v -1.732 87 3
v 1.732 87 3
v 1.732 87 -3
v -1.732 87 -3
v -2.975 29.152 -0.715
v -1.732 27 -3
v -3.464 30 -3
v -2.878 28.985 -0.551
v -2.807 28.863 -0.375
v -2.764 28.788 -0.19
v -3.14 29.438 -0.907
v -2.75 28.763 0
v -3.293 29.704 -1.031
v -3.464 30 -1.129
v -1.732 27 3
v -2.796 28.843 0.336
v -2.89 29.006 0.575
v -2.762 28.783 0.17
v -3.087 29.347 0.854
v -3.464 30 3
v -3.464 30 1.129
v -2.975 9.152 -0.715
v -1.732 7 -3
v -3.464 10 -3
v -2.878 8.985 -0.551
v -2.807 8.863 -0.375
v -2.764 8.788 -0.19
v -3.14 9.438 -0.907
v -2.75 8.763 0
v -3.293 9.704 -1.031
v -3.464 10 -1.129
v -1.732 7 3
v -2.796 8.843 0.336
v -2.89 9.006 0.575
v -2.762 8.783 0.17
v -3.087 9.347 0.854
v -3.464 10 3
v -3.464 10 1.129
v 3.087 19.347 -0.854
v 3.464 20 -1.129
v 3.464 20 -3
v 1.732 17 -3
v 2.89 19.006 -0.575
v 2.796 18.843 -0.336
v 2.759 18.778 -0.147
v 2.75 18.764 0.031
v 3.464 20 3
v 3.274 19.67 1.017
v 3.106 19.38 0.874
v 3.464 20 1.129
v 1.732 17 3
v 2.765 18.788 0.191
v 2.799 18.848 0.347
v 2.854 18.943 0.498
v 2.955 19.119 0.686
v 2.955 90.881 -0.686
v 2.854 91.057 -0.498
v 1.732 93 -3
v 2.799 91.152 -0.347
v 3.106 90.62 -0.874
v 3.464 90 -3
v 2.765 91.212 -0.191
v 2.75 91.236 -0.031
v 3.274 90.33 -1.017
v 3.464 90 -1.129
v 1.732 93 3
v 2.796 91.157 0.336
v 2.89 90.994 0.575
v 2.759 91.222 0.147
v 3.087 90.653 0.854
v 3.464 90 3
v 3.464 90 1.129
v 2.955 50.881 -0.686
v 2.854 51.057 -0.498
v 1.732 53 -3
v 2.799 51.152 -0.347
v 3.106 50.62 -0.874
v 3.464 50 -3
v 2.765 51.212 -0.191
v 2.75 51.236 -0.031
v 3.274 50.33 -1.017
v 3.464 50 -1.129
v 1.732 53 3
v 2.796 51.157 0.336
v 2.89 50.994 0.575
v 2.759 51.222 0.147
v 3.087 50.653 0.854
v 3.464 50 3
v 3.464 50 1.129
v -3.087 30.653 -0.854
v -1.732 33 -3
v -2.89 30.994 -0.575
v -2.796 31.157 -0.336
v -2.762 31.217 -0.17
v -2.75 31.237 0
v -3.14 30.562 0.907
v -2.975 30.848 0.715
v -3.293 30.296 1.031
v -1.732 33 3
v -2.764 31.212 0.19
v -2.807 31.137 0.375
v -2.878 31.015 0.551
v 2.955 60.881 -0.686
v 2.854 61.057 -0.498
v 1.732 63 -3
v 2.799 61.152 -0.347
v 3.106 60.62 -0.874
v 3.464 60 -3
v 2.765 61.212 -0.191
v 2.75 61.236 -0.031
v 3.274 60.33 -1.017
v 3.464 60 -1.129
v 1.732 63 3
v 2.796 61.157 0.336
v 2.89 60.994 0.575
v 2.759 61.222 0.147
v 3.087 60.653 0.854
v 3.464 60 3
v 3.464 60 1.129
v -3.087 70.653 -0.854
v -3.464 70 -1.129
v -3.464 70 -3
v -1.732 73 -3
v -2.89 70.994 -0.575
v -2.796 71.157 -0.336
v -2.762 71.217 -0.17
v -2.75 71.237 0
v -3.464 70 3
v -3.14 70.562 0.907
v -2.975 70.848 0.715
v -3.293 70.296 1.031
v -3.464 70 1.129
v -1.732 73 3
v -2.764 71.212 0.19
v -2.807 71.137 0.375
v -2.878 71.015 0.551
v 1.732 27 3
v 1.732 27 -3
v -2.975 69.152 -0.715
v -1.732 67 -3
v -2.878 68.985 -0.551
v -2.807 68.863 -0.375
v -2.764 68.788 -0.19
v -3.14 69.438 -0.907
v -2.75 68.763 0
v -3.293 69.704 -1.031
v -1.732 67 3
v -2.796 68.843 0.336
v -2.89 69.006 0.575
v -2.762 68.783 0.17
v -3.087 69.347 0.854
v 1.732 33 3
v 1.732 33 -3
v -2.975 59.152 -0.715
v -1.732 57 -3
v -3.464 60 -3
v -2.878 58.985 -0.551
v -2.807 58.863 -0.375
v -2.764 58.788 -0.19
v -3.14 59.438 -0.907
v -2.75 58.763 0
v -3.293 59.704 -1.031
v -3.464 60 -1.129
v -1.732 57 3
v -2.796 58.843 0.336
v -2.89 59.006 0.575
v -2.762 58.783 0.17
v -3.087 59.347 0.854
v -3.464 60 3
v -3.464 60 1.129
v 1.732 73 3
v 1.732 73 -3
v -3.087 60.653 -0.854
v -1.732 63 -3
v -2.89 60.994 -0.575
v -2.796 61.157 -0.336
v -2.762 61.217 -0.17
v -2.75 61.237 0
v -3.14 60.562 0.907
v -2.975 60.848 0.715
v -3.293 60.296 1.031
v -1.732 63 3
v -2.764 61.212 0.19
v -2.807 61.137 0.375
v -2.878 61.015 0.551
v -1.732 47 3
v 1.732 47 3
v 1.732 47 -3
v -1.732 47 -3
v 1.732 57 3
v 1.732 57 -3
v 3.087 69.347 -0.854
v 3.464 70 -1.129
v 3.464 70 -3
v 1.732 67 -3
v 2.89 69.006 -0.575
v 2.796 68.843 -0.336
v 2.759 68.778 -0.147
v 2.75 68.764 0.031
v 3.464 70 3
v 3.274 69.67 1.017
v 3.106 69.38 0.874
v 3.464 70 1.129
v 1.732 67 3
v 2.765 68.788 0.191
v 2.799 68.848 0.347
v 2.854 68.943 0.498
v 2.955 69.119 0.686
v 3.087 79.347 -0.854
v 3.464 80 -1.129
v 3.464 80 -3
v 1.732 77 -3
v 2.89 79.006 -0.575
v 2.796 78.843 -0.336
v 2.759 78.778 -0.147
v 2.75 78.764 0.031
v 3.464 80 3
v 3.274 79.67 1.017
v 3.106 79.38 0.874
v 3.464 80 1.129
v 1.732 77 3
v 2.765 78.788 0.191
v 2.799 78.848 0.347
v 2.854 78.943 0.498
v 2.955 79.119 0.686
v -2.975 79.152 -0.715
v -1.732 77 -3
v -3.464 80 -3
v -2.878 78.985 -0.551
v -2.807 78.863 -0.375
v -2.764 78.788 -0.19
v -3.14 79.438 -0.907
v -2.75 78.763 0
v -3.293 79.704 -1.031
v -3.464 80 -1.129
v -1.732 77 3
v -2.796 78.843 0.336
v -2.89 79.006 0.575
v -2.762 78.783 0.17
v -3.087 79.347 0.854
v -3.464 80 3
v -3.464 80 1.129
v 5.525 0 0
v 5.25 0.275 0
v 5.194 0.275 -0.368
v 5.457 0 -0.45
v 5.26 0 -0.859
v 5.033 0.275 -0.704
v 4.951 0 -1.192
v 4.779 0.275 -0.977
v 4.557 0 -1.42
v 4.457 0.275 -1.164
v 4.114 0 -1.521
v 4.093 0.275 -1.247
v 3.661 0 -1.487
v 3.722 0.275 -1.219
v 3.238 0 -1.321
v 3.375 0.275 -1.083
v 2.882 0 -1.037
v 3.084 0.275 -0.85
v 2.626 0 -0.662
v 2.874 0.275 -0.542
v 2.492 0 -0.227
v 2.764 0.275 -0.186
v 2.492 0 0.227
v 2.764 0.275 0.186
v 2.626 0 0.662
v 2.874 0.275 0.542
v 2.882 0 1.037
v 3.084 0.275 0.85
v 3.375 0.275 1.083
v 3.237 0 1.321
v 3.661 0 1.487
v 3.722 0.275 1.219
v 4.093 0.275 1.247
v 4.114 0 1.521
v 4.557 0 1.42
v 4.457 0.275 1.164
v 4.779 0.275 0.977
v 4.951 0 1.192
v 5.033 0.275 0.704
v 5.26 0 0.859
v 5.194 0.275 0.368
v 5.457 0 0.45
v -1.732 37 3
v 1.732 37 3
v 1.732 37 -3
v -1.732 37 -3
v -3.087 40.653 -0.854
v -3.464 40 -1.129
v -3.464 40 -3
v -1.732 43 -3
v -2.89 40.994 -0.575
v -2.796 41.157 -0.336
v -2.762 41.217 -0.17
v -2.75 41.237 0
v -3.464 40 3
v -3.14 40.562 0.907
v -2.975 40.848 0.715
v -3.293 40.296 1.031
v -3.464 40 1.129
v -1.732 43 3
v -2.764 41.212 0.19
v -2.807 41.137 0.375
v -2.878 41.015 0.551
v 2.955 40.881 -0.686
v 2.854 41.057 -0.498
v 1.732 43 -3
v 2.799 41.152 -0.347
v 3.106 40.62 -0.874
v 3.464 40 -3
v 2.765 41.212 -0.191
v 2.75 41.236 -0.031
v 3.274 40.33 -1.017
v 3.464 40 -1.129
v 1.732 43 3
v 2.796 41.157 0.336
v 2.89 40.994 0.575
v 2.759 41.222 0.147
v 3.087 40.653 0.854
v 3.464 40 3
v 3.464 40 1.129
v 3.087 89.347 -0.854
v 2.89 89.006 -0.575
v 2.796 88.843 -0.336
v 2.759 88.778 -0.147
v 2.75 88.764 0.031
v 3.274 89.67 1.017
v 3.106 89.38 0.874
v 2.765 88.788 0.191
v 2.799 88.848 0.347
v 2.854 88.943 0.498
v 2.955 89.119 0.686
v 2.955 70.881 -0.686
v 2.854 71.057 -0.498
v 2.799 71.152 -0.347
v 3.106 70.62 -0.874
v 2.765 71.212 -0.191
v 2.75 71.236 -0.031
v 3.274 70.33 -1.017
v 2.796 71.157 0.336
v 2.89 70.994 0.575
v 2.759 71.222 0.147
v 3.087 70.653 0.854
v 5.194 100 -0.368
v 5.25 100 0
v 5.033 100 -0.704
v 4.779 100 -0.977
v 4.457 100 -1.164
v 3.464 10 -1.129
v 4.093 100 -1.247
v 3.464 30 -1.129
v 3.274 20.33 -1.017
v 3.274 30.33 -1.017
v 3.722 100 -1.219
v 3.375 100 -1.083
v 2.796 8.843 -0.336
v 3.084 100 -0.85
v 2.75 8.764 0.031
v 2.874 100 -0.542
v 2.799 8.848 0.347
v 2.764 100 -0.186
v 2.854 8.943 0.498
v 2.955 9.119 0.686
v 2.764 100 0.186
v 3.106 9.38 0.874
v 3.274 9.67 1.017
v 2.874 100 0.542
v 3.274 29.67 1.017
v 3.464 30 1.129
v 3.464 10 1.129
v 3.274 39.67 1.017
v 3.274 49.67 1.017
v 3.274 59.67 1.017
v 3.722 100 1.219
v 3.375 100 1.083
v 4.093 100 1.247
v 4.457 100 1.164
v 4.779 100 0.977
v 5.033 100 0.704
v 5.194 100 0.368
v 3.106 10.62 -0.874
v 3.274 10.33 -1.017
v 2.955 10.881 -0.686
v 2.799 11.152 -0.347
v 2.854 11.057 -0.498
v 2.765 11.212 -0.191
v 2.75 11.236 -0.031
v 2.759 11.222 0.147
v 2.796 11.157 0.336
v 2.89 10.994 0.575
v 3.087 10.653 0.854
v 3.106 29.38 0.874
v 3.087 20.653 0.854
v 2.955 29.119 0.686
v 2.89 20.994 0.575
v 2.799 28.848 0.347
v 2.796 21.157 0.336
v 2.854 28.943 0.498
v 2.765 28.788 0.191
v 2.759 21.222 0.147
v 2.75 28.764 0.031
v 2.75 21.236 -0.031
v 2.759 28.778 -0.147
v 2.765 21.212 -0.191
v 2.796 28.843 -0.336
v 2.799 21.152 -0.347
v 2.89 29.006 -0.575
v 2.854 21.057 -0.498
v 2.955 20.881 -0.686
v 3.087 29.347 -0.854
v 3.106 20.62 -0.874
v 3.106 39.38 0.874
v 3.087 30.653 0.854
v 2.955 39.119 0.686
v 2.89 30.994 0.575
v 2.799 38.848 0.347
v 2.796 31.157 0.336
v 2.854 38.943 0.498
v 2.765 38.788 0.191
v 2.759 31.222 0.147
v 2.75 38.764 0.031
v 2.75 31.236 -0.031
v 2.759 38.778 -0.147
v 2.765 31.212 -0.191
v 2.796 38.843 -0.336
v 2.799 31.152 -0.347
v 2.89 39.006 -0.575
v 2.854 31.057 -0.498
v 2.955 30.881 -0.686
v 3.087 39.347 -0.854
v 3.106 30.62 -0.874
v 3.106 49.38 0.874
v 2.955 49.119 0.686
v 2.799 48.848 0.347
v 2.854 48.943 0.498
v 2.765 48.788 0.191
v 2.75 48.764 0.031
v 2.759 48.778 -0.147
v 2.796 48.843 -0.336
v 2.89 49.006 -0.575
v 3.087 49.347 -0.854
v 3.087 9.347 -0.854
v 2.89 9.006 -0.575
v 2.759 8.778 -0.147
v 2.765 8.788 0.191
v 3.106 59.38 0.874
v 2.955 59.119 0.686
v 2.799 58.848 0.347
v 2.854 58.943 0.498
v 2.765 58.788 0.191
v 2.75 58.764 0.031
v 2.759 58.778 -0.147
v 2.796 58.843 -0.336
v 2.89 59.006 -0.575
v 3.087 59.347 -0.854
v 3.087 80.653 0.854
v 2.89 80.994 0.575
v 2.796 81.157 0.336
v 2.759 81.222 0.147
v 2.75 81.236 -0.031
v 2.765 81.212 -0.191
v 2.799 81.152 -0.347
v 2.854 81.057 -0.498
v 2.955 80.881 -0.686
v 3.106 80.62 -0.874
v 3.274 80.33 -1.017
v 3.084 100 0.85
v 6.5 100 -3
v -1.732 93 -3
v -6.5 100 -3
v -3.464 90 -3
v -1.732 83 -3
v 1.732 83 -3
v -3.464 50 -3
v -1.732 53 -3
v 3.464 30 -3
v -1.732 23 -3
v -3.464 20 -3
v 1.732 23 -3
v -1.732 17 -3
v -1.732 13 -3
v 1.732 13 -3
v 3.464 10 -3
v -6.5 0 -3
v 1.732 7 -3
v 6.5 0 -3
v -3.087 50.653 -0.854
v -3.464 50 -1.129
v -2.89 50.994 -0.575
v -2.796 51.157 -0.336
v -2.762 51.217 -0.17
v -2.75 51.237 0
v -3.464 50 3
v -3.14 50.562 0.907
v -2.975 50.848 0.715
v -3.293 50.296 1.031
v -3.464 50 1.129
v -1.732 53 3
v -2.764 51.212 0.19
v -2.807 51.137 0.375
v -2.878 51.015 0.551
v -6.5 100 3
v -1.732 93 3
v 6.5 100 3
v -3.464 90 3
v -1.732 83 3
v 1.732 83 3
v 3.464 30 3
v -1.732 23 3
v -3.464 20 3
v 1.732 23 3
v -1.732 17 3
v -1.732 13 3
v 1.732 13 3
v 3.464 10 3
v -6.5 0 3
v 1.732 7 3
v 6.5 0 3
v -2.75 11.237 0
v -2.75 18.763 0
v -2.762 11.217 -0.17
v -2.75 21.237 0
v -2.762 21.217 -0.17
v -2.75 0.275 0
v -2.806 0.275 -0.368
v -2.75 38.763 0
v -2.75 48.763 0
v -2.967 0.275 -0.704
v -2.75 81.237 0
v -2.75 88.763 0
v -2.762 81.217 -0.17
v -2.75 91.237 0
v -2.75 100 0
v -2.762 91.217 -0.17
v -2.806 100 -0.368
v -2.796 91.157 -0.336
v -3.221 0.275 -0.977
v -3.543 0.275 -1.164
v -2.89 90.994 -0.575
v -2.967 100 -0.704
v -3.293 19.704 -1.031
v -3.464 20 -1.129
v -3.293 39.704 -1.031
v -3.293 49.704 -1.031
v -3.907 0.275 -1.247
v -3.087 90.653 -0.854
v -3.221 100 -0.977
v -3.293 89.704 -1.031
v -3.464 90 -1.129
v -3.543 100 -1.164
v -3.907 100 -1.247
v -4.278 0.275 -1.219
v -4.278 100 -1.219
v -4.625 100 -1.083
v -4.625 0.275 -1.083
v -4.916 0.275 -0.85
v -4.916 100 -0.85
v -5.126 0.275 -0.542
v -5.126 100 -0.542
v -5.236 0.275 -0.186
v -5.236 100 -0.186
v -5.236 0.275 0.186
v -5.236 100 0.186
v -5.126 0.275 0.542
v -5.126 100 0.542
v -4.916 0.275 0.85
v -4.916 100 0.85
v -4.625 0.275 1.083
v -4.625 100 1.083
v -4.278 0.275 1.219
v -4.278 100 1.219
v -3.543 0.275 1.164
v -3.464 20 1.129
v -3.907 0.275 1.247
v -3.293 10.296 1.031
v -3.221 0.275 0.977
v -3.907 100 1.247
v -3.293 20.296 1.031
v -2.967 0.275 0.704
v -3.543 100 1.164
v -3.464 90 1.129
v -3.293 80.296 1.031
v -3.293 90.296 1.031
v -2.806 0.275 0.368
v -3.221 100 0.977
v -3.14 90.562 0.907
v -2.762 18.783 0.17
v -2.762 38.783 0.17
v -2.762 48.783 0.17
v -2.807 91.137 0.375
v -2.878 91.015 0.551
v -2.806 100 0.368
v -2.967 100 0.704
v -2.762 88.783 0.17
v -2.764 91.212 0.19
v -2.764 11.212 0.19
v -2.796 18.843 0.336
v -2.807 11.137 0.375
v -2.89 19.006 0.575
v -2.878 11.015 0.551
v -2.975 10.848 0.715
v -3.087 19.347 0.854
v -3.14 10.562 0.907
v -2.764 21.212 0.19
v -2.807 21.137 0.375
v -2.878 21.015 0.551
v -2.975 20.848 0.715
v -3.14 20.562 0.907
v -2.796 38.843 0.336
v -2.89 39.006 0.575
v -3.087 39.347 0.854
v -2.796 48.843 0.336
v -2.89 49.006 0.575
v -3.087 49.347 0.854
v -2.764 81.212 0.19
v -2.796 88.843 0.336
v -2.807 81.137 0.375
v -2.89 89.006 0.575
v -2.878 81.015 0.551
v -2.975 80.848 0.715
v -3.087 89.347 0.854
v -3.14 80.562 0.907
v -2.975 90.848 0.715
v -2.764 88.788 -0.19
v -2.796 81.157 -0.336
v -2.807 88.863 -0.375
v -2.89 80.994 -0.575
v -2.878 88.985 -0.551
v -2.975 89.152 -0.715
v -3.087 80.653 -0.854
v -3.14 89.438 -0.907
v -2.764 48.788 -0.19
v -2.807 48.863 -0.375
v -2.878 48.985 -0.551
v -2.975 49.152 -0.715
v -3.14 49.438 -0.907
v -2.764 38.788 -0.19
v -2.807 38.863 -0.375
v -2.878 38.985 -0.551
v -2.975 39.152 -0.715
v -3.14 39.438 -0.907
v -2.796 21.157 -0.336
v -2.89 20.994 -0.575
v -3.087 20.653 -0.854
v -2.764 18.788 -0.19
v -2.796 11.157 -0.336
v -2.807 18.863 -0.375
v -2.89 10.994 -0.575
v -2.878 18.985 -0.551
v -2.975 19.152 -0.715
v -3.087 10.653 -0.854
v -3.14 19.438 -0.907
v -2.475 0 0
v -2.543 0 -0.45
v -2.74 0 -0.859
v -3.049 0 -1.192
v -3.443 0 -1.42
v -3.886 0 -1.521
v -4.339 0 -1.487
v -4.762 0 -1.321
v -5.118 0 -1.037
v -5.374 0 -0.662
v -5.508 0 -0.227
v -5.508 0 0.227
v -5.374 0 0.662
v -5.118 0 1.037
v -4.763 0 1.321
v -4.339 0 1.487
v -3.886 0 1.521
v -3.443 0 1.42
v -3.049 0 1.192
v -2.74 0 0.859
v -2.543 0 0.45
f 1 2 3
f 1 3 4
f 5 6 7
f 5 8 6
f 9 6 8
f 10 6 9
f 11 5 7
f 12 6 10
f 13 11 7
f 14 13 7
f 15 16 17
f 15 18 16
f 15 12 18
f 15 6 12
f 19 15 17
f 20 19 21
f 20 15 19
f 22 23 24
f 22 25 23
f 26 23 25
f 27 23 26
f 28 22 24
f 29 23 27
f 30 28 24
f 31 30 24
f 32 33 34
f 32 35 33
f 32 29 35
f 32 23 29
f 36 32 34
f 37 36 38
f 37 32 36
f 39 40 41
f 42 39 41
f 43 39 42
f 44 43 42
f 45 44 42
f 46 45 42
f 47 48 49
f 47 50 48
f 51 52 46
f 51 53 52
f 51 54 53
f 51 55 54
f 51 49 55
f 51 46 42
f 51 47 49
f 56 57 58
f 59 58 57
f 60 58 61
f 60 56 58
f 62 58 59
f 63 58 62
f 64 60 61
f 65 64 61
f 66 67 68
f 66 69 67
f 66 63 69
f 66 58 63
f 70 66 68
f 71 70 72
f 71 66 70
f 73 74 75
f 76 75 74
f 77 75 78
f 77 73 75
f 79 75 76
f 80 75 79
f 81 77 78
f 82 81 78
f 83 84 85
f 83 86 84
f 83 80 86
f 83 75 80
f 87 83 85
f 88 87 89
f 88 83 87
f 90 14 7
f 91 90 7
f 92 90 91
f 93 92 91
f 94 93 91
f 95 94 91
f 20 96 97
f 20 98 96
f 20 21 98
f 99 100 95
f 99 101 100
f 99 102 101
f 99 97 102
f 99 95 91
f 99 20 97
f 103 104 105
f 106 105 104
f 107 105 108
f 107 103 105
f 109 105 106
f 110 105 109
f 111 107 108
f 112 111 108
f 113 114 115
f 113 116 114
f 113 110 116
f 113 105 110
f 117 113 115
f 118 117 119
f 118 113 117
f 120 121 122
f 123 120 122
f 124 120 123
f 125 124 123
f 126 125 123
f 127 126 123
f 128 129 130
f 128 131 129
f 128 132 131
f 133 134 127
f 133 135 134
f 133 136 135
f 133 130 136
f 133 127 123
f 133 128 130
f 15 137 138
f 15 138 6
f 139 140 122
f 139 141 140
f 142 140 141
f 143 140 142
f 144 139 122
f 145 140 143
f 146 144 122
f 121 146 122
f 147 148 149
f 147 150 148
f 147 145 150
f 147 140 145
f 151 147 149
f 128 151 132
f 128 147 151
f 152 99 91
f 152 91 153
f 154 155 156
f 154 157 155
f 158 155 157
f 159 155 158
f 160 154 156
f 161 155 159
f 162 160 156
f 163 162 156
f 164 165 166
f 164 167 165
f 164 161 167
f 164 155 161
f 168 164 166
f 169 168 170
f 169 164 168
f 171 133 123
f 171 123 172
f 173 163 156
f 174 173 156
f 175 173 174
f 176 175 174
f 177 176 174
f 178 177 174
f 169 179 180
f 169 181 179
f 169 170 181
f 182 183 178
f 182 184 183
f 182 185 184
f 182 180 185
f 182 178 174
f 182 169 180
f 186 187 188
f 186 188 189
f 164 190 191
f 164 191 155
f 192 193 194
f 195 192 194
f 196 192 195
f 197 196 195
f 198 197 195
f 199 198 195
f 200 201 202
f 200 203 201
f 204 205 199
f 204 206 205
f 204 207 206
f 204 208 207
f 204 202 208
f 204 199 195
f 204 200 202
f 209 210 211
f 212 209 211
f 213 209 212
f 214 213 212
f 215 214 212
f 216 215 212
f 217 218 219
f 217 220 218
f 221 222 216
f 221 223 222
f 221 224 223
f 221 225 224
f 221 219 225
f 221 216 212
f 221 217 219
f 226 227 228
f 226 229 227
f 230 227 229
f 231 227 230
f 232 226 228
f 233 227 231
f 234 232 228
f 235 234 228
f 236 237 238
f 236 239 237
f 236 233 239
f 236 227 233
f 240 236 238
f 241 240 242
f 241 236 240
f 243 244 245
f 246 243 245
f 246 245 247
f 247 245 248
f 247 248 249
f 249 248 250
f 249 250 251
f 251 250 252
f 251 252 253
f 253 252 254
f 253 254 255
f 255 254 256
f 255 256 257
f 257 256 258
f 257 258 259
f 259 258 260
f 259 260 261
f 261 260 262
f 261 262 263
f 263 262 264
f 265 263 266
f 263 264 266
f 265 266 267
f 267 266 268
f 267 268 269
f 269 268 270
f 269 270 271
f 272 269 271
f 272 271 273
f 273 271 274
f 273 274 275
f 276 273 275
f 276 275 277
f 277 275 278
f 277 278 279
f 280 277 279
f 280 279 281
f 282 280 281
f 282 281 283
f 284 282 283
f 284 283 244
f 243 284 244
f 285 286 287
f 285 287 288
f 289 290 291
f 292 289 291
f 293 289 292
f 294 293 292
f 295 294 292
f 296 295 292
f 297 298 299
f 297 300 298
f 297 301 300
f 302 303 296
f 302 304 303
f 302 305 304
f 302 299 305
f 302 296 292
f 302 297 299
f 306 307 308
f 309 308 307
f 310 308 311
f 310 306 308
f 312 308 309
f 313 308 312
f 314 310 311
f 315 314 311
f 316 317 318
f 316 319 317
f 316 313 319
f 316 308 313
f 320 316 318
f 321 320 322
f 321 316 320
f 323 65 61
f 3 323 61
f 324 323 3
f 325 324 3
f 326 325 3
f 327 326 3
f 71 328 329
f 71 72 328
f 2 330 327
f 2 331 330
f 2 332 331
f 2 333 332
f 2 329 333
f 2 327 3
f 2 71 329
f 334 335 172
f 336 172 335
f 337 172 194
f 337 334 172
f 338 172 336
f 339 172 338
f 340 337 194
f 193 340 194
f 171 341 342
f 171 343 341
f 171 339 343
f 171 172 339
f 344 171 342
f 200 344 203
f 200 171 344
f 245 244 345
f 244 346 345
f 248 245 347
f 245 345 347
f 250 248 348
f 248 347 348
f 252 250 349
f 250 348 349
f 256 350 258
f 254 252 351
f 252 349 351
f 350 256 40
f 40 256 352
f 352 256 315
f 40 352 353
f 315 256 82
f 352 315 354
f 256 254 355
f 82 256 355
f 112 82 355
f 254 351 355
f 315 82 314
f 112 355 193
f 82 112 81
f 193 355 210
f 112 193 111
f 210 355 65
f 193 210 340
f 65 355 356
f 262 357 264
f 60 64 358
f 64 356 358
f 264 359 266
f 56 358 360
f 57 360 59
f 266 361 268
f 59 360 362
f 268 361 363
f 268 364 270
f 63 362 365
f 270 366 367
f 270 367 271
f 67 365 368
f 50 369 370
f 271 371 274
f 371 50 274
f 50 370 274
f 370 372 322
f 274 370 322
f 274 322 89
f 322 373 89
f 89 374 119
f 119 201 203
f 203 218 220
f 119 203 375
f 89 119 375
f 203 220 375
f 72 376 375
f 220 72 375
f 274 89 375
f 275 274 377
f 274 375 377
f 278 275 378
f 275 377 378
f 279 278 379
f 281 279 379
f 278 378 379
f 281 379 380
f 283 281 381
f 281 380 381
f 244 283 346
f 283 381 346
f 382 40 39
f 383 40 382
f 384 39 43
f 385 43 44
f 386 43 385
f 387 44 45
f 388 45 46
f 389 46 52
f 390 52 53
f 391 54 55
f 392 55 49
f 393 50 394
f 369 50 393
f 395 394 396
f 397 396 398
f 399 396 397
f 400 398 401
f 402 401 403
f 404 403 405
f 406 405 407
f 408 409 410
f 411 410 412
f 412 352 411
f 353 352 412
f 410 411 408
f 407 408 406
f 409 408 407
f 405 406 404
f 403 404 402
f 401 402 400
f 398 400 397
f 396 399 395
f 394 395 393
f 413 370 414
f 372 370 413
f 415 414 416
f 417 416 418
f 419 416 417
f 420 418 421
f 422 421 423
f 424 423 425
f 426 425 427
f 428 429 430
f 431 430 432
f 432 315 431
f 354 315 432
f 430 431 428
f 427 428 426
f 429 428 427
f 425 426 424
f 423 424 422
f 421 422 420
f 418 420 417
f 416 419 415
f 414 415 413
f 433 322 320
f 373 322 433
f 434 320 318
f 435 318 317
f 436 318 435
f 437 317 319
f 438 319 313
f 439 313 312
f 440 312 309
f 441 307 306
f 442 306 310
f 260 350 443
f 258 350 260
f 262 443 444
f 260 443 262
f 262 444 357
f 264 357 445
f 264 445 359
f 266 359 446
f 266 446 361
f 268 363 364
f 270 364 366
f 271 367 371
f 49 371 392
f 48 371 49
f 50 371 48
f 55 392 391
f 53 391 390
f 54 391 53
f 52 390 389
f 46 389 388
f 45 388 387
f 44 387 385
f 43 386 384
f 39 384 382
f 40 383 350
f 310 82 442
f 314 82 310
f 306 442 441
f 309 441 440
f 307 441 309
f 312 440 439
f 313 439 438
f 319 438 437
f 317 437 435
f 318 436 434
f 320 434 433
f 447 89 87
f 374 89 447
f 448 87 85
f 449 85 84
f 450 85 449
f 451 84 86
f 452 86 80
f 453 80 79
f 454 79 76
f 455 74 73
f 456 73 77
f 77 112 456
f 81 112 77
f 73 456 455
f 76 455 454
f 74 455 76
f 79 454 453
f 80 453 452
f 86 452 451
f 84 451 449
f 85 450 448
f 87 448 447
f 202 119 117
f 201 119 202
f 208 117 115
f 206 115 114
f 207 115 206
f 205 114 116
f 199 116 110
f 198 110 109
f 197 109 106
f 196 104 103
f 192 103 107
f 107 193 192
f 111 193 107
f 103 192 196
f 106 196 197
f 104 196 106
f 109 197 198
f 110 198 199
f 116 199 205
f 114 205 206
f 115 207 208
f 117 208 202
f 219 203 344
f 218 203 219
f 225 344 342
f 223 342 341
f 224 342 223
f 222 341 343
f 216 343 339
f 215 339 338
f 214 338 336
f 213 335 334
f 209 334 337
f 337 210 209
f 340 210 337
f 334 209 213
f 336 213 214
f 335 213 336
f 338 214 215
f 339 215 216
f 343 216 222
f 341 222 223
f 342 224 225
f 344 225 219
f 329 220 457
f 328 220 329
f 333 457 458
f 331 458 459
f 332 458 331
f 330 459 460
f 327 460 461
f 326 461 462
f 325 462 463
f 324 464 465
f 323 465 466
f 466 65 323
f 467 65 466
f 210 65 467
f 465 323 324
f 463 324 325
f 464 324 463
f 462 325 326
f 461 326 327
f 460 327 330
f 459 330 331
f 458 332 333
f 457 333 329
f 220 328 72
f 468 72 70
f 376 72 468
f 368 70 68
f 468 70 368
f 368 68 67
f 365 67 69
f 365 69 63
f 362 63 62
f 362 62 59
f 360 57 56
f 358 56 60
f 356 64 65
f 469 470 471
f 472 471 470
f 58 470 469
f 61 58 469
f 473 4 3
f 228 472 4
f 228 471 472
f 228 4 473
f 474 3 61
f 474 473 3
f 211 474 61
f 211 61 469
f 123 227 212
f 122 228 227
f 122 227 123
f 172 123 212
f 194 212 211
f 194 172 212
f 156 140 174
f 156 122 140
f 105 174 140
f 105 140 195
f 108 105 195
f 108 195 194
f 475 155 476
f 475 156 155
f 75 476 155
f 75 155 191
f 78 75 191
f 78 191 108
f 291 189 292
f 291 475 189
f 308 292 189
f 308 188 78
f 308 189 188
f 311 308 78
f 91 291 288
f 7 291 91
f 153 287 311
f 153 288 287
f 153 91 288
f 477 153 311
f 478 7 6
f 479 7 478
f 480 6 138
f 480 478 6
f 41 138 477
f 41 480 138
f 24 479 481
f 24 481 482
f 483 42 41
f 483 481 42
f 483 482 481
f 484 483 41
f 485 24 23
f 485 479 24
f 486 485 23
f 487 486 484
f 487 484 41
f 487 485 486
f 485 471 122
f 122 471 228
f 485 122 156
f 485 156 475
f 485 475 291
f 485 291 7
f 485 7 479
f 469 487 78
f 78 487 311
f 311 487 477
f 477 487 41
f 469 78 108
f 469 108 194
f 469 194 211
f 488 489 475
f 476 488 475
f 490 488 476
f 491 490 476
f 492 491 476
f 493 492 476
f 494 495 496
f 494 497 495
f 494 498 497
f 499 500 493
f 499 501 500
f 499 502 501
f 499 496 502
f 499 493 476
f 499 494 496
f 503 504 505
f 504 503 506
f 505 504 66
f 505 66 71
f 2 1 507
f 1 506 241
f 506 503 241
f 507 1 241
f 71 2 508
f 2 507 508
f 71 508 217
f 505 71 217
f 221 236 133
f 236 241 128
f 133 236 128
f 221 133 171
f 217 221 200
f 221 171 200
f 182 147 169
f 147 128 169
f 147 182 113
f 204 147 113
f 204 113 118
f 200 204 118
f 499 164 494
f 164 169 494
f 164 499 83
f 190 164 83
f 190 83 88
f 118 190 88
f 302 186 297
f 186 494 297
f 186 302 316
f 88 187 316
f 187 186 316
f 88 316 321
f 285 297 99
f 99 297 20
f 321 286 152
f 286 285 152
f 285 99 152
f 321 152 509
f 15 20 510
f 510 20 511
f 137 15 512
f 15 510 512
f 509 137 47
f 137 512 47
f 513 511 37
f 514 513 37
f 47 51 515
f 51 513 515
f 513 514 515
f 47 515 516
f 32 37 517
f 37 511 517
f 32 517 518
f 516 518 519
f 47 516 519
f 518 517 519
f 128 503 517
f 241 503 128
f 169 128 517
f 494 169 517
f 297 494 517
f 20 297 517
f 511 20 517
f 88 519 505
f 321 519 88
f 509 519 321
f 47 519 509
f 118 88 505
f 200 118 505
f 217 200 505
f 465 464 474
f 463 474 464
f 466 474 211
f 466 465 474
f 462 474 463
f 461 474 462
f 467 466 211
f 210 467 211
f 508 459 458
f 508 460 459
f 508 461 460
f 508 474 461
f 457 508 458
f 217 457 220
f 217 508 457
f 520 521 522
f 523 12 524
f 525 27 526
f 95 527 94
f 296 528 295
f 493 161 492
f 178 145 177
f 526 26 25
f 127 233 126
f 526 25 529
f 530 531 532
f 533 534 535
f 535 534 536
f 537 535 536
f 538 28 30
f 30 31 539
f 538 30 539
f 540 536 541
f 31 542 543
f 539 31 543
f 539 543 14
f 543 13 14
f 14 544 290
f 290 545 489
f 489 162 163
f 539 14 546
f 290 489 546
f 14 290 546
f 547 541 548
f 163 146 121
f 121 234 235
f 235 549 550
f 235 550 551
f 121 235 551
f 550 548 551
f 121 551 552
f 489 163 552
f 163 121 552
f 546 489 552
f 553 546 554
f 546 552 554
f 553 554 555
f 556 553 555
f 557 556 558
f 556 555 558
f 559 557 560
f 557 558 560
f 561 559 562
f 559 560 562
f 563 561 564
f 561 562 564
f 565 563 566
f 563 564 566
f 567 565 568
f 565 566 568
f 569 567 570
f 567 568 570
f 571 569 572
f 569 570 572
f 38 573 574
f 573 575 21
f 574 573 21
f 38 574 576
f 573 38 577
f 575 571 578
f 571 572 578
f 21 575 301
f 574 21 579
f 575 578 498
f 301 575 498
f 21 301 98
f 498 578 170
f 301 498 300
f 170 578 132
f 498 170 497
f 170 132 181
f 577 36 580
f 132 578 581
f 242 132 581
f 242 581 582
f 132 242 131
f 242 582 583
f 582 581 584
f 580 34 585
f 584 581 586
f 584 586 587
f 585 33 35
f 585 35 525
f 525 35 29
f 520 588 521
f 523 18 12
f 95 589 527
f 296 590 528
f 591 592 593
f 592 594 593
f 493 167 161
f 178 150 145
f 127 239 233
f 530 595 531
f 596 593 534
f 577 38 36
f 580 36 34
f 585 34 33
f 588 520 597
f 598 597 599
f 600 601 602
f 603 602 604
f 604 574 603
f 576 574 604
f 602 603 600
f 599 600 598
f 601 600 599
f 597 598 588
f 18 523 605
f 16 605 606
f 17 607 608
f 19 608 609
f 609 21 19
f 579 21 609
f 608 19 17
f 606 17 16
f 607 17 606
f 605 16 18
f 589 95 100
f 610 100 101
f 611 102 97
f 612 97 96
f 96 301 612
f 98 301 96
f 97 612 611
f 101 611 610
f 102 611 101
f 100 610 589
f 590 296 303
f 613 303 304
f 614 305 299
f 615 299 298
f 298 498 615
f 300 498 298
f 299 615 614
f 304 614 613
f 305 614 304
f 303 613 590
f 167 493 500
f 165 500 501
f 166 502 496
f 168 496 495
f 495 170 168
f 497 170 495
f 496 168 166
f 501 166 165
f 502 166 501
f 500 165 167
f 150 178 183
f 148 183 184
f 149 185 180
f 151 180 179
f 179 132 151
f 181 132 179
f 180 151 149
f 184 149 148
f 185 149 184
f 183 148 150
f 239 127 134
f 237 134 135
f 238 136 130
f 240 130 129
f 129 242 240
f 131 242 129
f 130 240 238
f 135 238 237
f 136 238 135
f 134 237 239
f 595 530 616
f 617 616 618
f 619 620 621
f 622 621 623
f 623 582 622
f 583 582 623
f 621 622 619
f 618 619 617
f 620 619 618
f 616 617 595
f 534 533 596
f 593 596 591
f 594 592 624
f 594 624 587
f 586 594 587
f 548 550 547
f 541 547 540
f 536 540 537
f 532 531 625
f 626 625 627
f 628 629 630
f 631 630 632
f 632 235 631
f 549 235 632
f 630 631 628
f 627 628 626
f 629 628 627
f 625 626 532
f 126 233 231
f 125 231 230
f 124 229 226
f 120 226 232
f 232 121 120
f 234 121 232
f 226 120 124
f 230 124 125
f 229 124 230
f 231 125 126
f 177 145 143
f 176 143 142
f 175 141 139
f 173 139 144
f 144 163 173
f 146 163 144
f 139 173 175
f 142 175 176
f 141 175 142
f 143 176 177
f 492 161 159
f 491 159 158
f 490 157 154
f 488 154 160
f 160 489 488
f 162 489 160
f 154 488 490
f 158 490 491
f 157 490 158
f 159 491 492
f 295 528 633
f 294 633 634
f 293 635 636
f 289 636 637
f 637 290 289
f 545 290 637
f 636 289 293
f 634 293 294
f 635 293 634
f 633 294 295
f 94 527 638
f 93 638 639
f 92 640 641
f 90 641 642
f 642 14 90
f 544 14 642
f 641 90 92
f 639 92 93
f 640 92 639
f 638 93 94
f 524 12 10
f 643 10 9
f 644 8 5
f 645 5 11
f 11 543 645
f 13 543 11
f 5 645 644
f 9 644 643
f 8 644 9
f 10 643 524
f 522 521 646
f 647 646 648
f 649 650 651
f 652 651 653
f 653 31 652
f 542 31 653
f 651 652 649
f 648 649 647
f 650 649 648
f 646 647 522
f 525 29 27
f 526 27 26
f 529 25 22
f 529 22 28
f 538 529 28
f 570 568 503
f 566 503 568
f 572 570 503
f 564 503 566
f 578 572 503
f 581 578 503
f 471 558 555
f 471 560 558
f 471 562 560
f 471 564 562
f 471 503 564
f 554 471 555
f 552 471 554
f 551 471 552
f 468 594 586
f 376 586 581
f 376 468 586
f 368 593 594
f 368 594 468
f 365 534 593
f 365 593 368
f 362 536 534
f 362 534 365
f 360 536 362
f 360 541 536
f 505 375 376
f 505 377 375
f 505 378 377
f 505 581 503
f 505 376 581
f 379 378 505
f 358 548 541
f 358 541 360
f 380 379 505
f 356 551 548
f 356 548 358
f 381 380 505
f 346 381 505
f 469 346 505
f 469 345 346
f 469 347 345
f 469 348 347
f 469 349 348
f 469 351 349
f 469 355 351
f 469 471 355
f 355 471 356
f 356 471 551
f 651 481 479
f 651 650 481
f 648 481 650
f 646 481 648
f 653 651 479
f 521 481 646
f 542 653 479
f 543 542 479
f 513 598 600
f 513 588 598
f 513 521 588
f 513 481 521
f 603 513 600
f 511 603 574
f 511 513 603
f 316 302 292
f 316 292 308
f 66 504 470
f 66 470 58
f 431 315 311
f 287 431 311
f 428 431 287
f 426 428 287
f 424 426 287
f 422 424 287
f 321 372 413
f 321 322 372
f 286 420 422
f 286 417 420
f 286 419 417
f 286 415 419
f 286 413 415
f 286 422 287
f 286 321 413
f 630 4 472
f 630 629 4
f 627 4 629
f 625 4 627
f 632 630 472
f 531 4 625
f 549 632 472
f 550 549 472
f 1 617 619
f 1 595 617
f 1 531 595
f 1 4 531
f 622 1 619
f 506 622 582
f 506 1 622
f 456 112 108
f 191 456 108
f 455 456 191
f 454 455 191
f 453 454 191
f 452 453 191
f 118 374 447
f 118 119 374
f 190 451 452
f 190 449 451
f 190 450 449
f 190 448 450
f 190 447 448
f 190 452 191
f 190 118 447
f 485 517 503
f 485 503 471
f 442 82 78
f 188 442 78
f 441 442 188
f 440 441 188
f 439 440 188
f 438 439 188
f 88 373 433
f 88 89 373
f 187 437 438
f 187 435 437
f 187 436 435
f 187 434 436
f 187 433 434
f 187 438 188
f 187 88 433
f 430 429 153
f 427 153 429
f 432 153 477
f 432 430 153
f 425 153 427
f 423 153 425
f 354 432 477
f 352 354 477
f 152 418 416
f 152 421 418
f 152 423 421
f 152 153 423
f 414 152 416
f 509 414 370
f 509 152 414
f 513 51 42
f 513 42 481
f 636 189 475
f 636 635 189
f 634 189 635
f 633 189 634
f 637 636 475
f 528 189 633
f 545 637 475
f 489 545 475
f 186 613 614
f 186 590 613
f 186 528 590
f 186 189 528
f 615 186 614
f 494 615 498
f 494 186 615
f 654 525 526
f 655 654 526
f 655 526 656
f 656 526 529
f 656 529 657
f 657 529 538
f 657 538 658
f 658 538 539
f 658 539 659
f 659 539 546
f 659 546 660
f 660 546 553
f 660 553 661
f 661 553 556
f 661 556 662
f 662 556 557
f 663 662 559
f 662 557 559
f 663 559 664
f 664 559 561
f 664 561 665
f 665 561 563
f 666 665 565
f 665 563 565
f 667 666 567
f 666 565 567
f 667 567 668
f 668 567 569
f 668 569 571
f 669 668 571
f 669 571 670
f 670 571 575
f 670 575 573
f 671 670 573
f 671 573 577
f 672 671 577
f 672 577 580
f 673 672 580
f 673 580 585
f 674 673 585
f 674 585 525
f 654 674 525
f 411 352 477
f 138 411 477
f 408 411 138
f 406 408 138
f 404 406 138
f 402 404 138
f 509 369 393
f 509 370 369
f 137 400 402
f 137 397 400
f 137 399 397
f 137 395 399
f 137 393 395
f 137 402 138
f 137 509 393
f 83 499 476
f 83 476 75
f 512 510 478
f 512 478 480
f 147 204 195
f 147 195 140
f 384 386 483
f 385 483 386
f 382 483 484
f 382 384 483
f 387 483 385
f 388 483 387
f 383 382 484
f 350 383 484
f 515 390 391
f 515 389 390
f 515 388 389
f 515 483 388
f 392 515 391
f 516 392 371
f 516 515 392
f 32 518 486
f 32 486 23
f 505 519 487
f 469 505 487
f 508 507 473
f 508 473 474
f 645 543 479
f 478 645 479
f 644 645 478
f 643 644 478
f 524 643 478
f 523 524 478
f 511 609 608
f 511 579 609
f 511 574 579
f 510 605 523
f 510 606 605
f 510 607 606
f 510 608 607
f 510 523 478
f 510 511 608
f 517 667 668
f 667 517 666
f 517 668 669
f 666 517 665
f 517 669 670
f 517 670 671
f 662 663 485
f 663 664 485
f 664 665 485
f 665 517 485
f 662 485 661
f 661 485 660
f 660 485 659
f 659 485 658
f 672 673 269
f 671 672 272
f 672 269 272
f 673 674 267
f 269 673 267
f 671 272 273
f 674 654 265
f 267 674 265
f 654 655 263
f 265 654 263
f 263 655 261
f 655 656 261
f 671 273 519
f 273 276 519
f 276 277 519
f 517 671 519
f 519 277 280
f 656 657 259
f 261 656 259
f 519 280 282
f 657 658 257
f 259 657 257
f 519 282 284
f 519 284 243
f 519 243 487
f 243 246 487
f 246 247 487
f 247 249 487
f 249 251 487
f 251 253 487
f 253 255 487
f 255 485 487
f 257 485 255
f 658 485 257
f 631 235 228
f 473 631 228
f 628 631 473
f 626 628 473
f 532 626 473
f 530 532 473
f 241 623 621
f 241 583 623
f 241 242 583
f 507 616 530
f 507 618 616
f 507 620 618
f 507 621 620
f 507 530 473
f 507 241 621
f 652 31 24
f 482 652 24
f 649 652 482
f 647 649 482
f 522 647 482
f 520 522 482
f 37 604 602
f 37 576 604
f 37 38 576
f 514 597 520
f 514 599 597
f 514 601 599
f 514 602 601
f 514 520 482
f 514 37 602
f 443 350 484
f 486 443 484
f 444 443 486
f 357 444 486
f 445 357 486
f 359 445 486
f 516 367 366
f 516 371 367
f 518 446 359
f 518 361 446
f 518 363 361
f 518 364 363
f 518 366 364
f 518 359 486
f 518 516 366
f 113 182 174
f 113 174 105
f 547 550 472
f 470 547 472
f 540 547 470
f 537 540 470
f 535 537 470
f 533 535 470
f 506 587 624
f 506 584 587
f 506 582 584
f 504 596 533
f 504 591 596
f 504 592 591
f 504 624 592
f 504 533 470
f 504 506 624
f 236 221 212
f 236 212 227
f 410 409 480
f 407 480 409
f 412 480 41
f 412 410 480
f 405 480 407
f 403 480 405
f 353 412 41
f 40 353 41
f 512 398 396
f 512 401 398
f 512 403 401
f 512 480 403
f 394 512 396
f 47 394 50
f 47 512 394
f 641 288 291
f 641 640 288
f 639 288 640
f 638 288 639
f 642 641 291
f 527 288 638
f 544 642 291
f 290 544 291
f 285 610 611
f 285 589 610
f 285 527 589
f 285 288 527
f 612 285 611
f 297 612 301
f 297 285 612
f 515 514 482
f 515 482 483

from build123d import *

# Parameters (mm, degrees)
SKETCH_1_W                   = 13
SKETCH_1_H                   = 6
EXTRUDE_1_DEPTH              = 100
CUT_EXTRUDE_1_DEPTH          = 101.390487597
CUT_EXTRUDE_1_DEPTH_BACK     = 101.390487597
HOLE_WIZARD_M3_1_D           = 2.5
HOLE_WIZARD_M3_1_CSINK_D     = 3.05
HOLE_WIZARD_M3_1_CSINK_ANGLE = 90


with BuildPart() as part:
    # 草图1 → 凸台-拉伸1 (new body)
    with BuildSketch(Plane(origin=(0, 0, 0), x_dir=(1, 0, 0), z_dir=(0, 1, 0))):
        Rectangle(SKETCH_1_W, SKETCH_1_H)
    extrude(amount=EXTRUDE_1_DEPTH)

    # 草图2 → 切除-拉伸1 (cut, two sides: drawn at the far end of the back side and taken through both)
    with BuildSketch(Plane(origin=(0, 0, -3), x_dir=(-1, 0, 0), z_dir=(0, 0, -1)).offset(-CUT_EXTRUDE_1_DEPTH_BACK)):
        Polygon((-1.732050808, 13), (-3.464101615, 10), (-1.732050808, 7), (1.732050808, 7), (3.464101615, 10), (1.732050808, 13), align=None)
        Polygon((-1.732050808, 23), (-3.464101615, 20), (-1.732050808, 17), (1.732050808, 17), (3.464101615, 20), (1.732050808, 23), align=None)
        Polygon((-1.732050808, 33), (-3.464101615, 30), (-1.732050808, 27), (1.732050808, 27), (3.464101615, 30), (1.732050808, 33), align=None)
        Polygon((-1.732050808, 43), (-3.464101615, 40), (-1.732050808, 37), (1.732050808, 37), (3.464101615, 40), (1.732050808, 43), align=None)
        Polygon((-1.732050808, 53), (-3.464101615, 50), (-1.732050808, 47), (1.732050808, 47), (3.464101615, 50), (1.732050808, 53), align=None)
        Polygon((-1.732050808, 63), (-3.464101615, 60), (-1.732050808, 57), (1.732050808, 57), (3.464101615, 60), (1.732050808, 63), align=None)
        Polygon((-1.732050808, 73), (-3.464101615, 70), (-1.732050808, 67), (1.732050808, 67), (3.464101615, 70), (1.732050808, 73), align=None)
        Polygon((-1.732050808, 83), (-3.464101615, 80), (-1.732050808, 77), (1.732050808, 77), (3.464101615, 80), (1.732050808, 83), align=None)
        Polygon((-1.732050808, 93), (-3.464101615, 90), (-1.732050808, 87), (1.732050808, 87), (3.464101615, 90), (1.732050808, 93), align=None)
    extrude(amount=CUT_EXTRUDE_1_DEPTH + CUT_EXTRUDE_1_DEPTH_BACK, mode=Mode.SUBTRACT)

    # M3 螺纹孔1 (through all)
    with Locations(Plane(origin=(0, 0, 0), x_dir=(-1, 0, 0), z_dir=(0, -1, 0))):
        with Locations((4, 0), (-4, 0)):
            CounterSinkHole(HOLE_WIZARD_M3_1_D / 2, HOLE_WIZARD_M3_1_CSINK_D / 2, counter_sink_angle=HOLE_WIZARD_M3_1_CSINK_ANGLE)


solid = part.part
